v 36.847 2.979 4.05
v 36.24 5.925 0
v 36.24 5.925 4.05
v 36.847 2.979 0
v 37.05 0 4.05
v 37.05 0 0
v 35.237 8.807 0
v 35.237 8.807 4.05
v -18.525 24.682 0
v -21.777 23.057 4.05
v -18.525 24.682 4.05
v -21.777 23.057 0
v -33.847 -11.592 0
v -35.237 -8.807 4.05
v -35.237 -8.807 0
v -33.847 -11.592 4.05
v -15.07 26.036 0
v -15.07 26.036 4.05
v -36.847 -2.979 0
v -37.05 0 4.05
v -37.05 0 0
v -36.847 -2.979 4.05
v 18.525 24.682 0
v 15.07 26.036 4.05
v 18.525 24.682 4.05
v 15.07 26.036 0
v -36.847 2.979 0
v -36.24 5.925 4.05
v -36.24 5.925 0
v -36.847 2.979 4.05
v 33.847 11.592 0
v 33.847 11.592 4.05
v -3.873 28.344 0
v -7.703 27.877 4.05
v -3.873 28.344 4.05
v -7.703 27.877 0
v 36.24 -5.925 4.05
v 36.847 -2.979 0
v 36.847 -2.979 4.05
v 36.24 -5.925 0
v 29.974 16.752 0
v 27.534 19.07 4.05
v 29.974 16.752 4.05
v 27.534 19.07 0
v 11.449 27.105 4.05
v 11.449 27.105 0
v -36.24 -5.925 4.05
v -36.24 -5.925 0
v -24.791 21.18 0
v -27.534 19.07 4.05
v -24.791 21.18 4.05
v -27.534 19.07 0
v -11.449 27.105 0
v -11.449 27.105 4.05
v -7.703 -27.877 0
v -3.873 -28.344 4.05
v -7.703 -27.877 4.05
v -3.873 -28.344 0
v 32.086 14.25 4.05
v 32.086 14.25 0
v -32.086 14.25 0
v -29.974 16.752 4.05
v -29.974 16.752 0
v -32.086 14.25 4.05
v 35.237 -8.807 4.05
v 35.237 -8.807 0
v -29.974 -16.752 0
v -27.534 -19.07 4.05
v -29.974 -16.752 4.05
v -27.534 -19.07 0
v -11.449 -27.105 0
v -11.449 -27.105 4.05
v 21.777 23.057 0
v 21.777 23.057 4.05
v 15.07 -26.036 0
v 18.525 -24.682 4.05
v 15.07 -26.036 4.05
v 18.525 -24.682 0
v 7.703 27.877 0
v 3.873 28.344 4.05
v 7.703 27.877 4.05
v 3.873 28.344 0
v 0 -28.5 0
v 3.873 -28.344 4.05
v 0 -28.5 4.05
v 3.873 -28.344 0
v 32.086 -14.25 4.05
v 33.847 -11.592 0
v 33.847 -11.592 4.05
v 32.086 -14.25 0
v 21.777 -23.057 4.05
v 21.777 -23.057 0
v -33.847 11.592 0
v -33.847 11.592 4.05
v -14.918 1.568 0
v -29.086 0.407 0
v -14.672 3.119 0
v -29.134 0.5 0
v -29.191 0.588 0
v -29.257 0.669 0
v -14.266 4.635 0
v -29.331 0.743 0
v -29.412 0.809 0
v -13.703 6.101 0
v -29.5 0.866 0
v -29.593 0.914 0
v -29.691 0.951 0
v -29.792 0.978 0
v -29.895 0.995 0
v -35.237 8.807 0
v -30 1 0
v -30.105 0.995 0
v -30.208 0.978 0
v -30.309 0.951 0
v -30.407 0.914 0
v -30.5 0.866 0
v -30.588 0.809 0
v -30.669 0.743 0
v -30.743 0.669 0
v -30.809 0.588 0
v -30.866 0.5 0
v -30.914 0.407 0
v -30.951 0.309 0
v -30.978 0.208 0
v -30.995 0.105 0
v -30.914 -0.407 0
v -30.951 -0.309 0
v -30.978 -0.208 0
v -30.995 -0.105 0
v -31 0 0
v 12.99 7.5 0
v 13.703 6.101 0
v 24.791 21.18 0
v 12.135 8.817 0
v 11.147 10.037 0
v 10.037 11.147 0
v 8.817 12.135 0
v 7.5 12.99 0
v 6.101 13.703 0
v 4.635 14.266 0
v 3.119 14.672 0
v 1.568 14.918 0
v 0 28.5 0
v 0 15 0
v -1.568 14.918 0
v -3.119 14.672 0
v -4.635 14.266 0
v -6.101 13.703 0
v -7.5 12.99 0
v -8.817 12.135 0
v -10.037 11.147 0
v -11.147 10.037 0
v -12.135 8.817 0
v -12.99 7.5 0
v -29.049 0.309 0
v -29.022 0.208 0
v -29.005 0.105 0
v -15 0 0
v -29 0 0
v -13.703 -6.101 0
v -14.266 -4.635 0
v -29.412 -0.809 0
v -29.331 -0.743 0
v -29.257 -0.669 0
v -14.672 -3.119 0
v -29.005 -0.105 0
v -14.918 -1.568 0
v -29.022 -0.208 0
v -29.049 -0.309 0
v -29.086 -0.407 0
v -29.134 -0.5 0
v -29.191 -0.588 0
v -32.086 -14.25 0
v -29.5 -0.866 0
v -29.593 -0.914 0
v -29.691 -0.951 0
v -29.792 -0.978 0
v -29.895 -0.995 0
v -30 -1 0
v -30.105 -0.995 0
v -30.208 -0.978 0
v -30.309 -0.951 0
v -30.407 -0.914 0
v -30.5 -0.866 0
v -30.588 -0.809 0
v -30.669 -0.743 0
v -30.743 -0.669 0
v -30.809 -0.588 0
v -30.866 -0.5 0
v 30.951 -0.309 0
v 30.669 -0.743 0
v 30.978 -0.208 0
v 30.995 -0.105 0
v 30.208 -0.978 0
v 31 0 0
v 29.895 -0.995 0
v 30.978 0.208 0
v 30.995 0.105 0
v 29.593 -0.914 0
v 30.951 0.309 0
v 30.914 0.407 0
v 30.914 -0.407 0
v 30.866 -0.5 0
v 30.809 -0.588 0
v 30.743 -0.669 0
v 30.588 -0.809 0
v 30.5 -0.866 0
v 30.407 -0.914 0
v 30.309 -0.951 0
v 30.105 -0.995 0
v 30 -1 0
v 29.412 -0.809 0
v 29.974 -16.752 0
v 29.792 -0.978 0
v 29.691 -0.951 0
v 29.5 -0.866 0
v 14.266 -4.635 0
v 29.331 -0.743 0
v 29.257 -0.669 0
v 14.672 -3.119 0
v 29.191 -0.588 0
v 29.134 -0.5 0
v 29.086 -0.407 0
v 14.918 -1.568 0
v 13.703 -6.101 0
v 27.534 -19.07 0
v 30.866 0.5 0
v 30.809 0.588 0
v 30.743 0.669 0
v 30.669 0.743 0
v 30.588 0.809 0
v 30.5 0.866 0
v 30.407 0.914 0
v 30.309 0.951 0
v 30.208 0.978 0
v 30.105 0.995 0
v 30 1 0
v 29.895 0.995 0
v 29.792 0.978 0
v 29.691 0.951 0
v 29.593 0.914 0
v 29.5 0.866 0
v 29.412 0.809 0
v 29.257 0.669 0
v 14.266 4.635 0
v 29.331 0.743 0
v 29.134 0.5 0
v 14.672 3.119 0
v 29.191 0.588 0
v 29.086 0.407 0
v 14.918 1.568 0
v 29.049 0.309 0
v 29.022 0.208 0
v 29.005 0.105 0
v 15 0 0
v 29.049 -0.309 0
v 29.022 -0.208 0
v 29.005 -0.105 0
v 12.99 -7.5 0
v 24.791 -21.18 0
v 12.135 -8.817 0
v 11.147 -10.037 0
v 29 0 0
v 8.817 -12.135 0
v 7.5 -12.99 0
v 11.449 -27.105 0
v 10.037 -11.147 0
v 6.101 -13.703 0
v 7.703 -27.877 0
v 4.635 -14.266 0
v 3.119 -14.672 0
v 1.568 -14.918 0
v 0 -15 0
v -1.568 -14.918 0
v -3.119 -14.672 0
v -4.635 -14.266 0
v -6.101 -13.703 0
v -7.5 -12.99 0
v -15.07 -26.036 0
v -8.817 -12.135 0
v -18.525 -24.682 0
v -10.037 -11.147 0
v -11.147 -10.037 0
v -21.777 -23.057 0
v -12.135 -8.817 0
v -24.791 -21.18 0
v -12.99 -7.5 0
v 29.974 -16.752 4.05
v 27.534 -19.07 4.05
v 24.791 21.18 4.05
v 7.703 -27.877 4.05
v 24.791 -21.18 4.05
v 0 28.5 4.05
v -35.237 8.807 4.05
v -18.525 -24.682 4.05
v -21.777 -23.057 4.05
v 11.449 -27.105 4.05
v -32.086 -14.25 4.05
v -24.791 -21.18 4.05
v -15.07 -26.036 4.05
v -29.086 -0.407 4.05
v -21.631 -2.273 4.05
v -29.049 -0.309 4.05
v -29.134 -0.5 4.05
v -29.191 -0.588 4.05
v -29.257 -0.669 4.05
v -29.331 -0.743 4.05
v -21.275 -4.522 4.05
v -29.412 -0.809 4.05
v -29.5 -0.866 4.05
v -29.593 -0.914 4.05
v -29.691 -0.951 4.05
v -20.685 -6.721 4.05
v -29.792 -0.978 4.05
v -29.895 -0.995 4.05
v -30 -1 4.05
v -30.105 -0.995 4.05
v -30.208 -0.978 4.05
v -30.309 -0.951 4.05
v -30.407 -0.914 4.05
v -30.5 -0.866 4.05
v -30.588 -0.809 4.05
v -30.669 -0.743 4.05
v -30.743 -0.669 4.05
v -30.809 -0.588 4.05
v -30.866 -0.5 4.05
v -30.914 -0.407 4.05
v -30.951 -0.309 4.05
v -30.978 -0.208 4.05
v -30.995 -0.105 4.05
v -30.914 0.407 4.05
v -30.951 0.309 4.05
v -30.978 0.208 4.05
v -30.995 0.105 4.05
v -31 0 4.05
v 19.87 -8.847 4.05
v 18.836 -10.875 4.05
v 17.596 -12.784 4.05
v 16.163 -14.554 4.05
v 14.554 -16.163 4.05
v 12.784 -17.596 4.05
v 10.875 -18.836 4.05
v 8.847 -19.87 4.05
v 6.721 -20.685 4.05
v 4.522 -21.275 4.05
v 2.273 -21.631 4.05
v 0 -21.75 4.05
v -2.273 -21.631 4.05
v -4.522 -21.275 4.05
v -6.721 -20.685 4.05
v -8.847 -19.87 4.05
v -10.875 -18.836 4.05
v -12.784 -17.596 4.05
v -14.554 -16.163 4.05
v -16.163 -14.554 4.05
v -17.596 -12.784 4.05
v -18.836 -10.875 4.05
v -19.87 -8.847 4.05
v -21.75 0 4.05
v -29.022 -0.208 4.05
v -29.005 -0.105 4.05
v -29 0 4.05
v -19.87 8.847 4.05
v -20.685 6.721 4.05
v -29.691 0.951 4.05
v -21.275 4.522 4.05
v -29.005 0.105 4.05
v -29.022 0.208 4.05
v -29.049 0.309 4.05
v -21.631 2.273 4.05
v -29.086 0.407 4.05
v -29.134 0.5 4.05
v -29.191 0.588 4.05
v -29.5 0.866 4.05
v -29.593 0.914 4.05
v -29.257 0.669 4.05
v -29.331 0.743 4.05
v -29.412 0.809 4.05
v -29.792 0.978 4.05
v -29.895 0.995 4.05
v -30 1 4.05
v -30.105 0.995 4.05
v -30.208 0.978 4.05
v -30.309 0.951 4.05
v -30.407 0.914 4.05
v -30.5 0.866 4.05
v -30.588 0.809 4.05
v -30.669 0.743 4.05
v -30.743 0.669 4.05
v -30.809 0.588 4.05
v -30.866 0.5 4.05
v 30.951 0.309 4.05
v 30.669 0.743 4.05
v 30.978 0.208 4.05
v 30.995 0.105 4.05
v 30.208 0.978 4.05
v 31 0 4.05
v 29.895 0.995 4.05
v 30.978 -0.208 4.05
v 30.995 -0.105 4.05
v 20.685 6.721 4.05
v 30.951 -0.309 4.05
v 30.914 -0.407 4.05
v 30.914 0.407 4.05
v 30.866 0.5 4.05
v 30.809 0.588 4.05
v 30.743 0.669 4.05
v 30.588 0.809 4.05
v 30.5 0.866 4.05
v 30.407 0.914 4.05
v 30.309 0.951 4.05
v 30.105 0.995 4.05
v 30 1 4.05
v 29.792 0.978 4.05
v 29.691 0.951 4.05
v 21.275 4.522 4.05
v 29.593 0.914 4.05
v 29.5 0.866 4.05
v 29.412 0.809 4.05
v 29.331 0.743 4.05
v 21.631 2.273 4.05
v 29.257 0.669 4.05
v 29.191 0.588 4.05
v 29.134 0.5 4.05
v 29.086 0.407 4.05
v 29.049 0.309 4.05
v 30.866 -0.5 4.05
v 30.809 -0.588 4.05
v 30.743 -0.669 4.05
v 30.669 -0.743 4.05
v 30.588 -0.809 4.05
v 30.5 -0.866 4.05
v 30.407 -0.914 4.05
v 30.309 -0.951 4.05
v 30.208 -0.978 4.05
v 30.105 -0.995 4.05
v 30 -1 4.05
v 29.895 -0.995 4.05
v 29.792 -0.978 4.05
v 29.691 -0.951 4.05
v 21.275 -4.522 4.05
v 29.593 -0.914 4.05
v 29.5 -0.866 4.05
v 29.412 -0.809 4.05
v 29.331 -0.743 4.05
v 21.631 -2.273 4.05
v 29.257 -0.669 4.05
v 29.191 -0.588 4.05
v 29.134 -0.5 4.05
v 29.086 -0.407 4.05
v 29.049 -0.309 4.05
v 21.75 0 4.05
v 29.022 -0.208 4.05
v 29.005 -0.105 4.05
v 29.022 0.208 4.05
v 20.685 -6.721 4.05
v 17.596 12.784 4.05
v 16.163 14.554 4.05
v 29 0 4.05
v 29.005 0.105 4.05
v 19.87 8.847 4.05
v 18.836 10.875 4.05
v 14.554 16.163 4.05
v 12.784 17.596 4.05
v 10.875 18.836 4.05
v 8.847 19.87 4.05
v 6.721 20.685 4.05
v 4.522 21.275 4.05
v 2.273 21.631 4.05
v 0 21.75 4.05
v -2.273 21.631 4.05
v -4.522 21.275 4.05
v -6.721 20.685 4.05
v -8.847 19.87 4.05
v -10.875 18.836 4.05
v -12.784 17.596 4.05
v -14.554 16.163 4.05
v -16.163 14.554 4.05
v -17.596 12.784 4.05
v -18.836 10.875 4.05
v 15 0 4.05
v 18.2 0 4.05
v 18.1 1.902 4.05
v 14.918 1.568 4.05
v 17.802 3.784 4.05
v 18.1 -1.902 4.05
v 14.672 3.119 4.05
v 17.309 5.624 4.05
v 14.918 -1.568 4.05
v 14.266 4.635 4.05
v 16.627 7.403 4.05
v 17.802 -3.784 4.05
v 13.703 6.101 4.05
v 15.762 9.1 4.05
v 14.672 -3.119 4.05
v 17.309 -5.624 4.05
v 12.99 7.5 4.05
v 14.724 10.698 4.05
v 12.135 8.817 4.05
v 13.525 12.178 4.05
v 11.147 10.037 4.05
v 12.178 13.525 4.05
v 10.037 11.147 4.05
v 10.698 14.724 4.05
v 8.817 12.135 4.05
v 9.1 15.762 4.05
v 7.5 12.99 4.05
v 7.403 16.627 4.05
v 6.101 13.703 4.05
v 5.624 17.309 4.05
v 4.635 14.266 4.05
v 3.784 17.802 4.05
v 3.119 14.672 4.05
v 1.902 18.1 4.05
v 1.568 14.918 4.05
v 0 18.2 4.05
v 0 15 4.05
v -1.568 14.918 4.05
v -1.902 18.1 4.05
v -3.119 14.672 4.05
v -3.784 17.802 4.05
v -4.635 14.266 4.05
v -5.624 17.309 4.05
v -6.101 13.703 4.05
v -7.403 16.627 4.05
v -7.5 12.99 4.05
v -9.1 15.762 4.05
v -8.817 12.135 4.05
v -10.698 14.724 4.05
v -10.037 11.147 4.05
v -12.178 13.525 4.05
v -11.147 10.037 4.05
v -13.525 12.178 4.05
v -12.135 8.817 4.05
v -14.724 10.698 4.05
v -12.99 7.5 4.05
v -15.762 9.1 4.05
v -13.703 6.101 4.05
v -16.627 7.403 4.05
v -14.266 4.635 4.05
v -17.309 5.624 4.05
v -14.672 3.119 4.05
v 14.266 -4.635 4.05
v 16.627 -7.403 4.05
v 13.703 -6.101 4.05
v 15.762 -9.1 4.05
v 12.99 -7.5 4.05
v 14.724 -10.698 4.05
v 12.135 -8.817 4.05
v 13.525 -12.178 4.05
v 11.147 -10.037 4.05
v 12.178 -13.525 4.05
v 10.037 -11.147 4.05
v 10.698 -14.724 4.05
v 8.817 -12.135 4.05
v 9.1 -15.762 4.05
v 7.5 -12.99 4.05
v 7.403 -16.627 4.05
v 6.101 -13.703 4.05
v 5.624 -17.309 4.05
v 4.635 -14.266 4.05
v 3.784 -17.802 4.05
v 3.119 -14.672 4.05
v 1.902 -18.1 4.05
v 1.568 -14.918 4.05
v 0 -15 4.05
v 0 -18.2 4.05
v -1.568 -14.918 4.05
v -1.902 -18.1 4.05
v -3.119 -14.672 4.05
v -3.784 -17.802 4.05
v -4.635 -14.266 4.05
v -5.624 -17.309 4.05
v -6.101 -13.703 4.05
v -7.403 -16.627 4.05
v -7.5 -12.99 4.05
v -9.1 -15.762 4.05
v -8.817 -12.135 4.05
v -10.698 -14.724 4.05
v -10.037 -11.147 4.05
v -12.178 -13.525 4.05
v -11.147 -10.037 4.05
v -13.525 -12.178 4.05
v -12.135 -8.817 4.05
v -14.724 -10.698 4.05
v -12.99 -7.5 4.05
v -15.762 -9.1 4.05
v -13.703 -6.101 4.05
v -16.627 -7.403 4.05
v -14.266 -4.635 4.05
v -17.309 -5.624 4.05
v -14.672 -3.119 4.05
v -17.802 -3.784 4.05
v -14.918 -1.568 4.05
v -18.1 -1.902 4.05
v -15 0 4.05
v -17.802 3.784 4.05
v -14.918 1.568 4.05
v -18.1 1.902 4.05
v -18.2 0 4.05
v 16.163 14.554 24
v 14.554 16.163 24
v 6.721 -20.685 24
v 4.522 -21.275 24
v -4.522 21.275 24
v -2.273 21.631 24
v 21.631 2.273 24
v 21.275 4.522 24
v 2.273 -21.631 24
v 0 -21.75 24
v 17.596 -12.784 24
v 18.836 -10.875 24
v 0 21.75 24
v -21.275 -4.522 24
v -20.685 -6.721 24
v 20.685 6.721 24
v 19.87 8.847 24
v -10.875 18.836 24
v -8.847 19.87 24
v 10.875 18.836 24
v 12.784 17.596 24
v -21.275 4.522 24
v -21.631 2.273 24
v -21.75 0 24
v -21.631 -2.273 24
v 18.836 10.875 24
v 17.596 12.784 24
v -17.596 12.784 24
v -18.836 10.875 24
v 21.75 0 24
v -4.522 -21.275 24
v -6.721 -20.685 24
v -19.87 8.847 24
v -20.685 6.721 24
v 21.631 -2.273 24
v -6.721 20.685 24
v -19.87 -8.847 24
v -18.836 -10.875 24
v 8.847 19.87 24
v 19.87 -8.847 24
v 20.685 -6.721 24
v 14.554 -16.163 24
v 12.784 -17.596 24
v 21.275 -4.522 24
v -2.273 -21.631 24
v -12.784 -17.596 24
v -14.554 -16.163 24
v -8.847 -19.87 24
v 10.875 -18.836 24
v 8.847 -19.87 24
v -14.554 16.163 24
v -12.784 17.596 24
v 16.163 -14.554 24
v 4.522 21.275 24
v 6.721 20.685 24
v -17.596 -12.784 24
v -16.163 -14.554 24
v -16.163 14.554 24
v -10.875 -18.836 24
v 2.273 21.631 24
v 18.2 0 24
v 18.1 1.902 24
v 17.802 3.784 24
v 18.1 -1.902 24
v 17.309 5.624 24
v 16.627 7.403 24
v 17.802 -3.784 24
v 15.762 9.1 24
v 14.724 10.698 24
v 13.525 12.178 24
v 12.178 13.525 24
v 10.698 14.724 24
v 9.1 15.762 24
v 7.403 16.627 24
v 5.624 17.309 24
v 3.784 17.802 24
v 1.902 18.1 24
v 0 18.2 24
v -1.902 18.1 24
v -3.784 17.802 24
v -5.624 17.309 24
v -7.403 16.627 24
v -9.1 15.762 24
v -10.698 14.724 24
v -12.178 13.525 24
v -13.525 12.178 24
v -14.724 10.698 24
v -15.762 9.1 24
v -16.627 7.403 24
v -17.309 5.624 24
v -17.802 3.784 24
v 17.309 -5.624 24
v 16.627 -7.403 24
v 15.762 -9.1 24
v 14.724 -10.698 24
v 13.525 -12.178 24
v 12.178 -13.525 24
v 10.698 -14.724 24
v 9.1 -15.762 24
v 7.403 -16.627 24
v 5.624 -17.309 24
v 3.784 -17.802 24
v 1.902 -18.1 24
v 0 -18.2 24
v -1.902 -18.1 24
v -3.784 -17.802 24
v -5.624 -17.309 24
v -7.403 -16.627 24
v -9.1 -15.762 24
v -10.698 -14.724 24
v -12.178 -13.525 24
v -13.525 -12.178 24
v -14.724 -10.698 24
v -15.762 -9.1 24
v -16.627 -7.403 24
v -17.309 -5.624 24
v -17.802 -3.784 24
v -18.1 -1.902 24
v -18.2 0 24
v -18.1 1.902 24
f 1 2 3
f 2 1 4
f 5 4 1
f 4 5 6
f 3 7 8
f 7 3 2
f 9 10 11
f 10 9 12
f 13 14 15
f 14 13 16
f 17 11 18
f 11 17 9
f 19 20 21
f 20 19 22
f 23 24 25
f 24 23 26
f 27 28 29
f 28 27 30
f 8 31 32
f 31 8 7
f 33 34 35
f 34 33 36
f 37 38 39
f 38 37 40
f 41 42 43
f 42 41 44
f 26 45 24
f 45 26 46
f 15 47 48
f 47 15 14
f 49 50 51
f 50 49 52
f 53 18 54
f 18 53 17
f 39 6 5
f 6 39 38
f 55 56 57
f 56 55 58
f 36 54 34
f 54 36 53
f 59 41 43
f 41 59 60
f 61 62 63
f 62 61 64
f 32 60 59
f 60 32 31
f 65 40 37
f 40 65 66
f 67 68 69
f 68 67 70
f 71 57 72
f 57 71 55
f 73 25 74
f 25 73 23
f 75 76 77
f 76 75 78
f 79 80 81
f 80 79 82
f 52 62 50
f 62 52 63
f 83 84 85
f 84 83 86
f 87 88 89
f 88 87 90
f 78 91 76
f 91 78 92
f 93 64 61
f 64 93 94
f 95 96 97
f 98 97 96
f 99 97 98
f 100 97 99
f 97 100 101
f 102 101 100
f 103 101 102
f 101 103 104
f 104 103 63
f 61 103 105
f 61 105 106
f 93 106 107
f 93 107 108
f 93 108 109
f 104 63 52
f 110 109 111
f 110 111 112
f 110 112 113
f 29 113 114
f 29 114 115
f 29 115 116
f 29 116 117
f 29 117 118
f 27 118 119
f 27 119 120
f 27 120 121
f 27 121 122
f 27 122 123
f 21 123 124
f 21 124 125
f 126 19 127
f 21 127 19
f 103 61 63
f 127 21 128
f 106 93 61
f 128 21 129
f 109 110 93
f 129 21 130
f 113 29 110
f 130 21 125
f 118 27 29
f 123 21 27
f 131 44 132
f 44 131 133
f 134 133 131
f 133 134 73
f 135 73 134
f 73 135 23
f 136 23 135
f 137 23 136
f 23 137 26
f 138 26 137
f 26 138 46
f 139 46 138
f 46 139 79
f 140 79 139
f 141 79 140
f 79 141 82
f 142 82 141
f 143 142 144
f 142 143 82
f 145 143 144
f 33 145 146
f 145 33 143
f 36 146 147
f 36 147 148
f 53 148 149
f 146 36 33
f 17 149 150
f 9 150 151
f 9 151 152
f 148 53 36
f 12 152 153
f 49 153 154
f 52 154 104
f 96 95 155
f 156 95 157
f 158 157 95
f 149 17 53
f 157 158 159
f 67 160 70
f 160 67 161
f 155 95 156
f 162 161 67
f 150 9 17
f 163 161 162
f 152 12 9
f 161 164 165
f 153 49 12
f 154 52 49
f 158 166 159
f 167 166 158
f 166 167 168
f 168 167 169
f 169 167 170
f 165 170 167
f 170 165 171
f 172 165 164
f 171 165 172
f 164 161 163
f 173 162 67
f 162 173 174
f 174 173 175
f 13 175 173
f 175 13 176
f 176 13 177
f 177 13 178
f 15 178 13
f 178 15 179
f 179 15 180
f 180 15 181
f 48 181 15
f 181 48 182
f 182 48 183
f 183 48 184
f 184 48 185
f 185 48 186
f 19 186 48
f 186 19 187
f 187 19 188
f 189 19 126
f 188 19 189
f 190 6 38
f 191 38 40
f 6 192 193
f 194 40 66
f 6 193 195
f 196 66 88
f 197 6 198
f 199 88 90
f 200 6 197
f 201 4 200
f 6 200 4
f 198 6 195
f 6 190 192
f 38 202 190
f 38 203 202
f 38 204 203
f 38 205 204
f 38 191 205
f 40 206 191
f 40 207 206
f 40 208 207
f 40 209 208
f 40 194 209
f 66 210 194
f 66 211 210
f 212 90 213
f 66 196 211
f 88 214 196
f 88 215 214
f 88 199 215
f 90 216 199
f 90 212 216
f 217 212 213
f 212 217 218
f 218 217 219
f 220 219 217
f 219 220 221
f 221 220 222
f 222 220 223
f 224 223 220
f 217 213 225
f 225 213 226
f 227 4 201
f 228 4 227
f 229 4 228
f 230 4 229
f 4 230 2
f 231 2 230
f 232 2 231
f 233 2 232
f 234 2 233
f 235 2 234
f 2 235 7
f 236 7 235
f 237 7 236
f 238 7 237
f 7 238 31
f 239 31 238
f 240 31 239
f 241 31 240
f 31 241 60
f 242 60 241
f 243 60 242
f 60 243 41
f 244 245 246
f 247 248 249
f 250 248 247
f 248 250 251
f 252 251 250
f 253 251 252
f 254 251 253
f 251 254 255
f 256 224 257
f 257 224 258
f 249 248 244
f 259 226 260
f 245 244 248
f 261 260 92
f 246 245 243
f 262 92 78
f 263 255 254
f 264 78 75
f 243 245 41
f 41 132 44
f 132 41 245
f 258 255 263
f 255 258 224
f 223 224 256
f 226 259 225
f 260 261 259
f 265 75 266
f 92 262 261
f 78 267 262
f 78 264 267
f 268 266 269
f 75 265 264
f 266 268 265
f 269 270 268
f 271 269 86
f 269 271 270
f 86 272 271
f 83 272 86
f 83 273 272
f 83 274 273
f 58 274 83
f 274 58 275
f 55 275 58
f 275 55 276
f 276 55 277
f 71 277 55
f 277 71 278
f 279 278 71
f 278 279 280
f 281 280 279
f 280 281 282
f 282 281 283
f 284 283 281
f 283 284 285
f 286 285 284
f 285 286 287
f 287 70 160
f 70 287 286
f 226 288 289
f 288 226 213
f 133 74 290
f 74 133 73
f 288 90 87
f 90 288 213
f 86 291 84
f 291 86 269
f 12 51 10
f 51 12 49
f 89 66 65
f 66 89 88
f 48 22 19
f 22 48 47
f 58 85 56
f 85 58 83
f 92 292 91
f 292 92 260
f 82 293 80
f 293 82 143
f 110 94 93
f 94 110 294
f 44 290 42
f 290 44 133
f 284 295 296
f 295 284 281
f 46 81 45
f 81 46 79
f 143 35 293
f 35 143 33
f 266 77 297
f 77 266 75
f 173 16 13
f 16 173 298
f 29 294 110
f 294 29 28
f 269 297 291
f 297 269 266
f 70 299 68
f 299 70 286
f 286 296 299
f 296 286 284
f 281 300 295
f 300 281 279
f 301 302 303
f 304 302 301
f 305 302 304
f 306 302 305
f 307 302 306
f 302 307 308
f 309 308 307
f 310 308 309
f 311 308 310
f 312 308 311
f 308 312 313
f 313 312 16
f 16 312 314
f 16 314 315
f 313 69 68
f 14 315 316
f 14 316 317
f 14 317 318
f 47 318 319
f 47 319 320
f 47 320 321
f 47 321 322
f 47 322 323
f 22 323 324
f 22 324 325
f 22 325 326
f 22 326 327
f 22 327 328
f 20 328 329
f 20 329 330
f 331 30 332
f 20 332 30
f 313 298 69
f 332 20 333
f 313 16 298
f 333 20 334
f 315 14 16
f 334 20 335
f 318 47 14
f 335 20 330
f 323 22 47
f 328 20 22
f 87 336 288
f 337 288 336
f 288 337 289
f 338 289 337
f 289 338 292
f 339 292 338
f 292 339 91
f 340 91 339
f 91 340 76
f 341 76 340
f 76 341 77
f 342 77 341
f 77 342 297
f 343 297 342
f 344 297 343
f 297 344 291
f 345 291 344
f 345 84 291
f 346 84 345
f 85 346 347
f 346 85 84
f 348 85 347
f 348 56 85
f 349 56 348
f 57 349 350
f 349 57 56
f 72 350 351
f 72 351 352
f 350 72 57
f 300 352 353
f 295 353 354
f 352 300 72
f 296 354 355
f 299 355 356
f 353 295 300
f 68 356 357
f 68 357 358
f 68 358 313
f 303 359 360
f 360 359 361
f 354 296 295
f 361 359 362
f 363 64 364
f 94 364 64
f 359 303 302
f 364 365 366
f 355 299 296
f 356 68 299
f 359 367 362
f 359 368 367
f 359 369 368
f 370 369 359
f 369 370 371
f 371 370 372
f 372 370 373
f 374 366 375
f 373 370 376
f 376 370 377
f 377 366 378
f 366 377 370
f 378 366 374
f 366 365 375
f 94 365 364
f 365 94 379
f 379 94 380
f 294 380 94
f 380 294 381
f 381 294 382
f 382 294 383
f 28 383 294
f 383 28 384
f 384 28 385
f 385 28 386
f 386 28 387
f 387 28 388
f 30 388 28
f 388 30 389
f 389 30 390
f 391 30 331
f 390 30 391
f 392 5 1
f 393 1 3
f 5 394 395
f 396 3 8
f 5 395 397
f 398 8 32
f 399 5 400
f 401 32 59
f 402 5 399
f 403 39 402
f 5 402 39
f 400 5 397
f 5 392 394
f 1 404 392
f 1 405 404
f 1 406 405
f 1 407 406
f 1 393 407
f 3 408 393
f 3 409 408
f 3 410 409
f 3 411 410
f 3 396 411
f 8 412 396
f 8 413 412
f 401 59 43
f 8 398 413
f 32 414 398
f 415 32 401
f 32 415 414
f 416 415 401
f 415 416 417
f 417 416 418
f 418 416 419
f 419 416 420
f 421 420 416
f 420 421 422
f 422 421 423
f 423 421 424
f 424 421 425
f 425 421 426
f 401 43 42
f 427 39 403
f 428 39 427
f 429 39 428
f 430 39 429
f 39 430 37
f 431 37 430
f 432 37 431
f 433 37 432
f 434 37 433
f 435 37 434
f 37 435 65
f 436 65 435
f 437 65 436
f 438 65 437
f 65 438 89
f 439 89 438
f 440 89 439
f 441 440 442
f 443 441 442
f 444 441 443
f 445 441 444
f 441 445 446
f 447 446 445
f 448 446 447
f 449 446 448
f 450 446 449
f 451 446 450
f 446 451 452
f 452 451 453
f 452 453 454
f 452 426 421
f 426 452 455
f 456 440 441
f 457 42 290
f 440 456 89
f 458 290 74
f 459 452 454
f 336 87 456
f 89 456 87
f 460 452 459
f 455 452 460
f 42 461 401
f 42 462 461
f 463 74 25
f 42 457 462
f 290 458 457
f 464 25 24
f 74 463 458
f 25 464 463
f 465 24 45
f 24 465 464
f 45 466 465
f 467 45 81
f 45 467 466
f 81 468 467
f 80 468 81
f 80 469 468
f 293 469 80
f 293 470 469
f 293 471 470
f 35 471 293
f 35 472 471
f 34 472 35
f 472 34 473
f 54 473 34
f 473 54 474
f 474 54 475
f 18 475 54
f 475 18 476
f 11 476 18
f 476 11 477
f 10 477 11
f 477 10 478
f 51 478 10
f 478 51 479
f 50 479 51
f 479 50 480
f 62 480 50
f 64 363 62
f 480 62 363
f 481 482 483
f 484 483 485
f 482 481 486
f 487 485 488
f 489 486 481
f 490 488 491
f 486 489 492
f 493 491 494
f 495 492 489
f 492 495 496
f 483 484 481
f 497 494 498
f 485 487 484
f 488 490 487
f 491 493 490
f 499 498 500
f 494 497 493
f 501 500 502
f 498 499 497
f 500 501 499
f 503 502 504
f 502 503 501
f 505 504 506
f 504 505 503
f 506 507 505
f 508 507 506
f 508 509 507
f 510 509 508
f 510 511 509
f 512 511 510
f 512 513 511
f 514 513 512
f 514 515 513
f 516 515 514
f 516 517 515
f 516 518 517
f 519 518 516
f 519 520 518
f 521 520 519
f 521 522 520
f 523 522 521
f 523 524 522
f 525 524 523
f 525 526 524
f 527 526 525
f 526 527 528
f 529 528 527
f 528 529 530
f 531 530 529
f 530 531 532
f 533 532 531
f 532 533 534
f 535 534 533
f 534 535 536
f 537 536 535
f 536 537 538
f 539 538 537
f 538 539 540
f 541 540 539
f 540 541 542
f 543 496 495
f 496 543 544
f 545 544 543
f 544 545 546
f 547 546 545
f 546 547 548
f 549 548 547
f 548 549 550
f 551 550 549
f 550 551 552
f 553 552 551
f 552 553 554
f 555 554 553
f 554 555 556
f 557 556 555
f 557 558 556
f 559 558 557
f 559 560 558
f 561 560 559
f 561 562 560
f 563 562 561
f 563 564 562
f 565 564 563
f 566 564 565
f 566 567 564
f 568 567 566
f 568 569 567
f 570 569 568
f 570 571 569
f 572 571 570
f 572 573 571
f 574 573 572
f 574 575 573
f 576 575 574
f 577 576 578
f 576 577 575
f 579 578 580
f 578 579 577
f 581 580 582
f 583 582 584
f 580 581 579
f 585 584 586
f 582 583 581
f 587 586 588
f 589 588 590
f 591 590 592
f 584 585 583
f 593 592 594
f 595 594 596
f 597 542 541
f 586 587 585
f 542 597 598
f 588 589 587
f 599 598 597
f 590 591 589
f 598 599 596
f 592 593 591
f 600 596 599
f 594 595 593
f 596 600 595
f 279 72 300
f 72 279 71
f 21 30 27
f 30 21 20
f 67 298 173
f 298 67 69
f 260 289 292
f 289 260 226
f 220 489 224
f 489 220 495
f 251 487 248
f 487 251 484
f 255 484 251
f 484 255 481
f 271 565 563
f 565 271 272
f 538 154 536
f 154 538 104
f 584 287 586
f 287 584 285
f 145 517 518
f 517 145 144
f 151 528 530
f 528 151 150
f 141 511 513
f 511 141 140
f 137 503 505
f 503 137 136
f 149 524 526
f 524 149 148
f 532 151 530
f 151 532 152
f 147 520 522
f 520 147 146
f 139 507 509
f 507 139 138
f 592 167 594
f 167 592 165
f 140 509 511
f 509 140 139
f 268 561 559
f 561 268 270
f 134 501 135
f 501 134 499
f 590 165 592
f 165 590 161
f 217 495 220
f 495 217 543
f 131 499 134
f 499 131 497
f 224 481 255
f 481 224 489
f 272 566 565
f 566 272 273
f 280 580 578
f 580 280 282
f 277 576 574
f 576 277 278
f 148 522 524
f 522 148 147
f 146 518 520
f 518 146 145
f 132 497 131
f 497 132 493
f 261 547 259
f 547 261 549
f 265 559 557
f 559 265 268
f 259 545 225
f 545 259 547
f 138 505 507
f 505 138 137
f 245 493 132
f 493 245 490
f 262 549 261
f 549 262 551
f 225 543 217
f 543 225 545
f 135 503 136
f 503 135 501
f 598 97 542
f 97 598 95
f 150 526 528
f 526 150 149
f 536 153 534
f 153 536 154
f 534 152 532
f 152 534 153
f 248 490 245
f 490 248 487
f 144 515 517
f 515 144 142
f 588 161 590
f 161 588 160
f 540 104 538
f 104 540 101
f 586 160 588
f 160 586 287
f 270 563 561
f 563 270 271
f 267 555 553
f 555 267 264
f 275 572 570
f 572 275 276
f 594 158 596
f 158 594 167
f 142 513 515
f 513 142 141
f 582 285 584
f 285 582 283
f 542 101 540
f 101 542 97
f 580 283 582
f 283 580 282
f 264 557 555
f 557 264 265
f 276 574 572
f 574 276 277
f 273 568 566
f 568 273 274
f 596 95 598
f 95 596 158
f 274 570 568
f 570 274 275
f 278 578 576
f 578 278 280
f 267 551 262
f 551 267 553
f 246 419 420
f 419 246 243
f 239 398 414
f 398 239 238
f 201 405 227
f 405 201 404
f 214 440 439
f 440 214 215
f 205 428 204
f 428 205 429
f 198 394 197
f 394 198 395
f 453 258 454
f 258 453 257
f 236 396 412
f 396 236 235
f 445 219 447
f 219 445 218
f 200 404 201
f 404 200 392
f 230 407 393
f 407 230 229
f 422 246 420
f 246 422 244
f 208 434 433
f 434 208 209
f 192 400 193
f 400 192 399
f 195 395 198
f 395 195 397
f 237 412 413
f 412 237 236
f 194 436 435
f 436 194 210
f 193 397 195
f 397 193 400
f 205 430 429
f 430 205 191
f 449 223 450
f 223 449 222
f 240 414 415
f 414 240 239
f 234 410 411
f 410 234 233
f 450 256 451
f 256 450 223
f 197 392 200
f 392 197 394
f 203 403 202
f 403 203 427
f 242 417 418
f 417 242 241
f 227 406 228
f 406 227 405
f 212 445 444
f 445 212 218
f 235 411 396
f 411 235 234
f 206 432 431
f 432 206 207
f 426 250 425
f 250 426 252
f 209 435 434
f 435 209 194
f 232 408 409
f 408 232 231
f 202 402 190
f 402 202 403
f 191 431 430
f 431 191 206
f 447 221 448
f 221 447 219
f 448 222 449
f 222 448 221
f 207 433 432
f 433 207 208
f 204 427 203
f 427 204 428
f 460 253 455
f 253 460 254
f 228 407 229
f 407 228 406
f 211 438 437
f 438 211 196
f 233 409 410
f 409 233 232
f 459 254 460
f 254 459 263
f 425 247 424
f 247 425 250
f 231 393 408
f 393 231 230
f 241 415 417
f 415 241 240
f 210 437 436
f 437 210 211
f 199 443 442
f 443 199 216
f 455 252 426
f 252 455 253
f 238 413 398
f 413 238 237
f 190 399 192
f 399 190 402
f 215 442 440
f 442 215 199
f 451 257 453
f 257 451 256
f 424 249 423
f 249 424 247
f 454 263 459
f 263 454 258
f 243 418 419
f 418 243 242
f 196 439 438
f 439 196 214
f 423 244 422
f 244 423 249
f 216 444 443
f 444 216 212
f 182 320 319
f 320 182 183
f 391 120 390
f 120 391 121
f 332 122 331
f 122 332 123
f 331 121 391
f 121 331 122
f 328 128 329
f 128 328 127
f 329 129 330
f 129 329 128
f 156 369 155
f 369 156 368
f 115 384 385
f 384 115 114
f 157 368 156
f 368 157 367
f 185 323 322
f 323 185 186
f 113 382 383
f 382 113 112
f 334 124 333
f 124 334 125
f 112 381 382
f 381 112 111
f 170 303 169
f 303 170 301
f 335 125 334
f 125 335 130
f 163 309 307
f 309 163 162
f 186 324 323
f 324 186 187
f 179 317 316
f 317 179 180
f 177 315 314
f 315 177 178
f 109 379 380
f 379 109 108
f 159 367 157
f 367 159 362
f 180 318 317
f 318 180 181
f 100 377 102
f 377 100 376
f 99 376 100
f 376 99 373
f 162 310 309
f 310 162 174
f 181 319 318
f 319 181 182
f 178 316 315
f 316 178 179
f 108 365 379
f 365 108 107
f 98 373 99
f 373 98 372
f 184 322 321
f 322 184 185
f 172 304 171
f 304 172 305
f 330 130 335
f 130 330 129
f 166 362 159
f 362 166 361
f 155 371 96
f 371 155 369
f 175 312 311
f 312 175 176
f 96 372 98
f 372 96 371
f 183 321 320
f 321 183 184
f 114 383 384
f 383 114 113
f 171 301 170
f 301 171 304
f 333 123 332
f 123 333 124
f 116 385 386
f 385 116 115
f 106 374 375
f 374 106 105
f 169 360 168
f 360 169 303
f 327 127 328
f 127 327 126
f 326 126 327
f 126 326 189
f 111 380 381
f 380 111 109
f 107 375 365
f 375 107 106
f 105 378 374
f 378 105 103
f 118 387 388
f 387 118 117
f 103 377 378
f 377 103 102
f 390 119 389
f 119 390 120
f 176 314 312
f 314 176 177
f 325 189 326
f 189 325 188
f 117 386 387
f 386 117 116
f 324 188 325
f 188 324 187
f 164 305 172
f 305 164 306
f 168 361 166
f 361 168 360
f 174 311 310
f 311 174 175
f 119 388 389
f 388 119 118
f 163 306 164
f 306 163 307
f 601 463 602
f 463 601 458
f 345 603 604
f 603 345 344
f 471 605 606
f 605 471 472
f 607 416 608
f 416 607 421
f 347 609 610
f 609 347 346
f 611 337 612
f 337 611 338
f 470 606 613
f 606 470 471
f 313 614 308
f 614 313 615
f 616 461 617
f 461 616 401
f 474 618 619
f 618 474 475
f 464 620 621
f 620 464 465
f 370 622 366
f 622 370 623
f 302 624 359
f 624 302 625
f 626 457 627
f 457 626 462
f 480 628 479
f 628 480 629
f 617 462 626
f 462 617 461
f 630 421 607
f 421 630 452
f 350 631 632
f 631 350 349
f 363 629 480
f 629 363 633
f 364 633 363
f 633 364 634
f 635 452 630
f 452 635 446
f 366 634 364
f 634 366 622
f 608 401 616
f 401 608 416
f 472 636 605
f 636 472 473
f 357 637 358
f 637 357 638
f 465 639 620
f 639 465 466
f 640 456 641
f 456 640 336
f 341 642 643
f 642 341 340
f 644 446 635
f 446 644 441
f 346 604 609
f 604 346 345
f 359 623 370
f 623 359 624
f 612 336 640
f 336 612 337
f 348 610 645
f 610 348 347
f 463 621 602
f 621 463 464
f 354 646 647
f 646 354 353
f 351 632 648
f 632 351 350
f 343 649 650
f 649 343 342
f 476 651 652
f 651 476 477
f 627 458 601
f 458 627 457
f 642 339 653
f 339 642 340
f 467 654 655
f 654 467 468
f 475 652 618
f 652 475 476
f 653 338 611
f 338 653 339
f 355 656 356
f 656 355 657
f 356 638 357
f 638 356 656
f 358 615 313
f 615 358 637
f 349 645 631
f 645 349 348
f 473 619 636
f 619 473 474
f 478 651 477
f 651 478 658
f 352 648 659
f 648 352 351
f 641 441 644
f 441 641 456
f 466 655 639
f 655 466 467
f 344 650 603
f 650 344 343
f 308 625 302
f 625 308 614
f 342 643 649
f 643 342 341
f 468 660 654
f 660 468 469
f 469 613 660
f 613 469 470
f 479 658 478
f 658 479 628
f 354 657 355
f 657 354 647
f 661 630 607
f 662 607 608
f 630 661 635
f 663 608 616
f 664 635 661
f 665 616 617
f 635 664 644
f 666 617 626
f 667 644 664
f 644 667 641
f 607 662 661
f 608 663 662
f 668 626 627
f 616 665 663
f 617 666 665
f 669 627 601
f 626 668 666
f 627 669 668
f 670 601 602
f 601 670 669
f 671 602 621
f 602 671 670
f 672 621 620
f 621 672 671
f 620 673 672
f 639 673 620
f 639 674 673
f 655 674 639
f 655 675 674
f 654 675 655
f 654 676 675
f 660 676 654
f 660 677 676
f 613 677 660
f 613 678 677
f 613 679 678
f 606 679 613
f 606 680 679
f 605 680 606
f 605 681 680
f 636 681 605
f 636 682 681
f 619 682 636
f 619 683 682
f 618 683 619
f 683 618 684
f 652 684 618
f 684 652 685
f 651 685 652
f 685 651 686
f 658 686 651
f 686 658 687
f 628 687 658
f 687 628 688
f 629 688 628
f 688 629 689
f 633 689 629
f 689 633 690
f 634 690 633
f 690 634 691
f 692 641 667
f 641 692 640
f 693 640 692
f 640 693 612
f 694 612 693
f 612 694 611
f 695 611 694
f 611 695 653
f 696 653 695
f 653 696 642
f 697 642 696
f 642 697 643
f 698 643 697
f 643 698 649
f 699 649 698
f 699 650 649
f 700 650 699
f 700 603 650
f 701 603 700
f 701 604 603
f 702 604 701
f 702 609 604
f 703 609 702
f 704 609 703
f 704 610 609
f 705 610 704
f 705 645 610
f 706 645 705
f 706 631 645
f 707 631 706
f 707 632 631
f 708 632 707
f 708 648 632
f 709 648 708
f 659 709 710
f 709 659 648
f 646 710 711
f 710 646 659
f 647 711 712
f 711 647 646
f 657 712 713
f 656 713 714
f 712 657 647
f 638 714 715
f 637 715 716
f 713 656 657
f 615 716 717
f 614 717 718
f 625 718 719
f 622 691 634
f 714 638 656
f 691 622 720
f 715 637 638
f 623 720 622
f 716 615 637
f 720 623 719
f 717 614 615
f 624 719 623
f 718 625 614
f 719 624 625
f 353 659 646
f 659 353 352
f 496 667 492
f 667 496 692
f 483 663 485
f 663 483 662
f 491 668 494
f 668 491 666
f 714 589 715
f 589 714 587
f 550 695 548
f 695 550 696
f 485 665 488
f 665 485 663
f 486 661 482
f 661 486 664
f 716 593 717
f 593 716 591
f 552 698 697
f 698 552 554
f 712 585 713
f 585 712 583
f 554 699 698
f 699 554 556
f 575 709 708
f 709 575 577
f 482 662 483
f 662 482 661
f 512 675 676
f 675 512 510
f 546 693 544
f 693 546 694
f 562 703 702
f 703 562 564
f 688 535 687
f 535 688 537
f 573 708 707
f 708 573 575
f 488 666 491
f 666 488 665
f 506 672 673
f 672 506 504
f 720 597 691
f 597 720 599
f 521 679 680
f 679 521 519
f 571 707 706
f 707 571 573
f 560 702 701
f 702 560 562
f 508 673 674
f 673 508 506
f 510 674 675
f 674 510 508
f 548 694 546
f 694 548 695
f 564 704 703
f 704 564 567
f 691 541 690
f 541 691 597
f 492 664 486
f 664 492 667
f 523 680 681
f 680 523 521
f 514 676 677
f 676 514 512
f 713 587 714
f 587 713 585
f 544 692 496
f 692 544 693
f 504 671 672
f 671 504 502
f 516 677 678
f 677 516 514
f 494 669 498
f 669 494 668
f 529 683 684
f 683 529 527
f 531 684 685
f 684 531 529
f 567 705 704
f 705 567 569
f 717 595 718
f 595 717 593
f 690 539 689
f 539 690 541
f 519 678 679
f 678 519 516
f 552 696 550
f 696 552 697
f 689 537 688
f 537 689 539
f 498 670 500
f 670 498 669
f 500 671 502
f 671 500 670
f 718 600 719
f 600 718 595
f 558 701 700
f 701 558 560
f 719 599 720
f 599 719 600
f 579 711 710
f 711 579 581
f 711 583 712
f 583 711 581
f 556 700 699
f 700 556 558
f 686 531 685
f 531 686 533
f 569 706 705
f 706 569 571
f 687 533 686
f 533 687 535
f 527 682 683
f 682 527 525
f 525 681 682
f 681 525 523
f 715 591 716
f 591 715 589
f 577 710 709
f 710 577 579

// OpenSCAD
// 1.75" hole (44mm)
$fn=60;

difference() {
   scale([1.3,1,1]) cylinder(d=57,h=4.05);
   translate([0,0,-0.05]) cylinder(d=30,h=4.2);
   translate([30,0,-0.05]) cylinder(d=2,h=4.2);
   translate([-30,0,-0.05]) cylinder(d=2,h=4.2);
}

translate([0,0,4]) difference() {
   translate([0,0,0]) cylinder(d=43.5,h=20);
   translate([0,0,-0.05]) cylinder(d=36.4,h=21);
}
